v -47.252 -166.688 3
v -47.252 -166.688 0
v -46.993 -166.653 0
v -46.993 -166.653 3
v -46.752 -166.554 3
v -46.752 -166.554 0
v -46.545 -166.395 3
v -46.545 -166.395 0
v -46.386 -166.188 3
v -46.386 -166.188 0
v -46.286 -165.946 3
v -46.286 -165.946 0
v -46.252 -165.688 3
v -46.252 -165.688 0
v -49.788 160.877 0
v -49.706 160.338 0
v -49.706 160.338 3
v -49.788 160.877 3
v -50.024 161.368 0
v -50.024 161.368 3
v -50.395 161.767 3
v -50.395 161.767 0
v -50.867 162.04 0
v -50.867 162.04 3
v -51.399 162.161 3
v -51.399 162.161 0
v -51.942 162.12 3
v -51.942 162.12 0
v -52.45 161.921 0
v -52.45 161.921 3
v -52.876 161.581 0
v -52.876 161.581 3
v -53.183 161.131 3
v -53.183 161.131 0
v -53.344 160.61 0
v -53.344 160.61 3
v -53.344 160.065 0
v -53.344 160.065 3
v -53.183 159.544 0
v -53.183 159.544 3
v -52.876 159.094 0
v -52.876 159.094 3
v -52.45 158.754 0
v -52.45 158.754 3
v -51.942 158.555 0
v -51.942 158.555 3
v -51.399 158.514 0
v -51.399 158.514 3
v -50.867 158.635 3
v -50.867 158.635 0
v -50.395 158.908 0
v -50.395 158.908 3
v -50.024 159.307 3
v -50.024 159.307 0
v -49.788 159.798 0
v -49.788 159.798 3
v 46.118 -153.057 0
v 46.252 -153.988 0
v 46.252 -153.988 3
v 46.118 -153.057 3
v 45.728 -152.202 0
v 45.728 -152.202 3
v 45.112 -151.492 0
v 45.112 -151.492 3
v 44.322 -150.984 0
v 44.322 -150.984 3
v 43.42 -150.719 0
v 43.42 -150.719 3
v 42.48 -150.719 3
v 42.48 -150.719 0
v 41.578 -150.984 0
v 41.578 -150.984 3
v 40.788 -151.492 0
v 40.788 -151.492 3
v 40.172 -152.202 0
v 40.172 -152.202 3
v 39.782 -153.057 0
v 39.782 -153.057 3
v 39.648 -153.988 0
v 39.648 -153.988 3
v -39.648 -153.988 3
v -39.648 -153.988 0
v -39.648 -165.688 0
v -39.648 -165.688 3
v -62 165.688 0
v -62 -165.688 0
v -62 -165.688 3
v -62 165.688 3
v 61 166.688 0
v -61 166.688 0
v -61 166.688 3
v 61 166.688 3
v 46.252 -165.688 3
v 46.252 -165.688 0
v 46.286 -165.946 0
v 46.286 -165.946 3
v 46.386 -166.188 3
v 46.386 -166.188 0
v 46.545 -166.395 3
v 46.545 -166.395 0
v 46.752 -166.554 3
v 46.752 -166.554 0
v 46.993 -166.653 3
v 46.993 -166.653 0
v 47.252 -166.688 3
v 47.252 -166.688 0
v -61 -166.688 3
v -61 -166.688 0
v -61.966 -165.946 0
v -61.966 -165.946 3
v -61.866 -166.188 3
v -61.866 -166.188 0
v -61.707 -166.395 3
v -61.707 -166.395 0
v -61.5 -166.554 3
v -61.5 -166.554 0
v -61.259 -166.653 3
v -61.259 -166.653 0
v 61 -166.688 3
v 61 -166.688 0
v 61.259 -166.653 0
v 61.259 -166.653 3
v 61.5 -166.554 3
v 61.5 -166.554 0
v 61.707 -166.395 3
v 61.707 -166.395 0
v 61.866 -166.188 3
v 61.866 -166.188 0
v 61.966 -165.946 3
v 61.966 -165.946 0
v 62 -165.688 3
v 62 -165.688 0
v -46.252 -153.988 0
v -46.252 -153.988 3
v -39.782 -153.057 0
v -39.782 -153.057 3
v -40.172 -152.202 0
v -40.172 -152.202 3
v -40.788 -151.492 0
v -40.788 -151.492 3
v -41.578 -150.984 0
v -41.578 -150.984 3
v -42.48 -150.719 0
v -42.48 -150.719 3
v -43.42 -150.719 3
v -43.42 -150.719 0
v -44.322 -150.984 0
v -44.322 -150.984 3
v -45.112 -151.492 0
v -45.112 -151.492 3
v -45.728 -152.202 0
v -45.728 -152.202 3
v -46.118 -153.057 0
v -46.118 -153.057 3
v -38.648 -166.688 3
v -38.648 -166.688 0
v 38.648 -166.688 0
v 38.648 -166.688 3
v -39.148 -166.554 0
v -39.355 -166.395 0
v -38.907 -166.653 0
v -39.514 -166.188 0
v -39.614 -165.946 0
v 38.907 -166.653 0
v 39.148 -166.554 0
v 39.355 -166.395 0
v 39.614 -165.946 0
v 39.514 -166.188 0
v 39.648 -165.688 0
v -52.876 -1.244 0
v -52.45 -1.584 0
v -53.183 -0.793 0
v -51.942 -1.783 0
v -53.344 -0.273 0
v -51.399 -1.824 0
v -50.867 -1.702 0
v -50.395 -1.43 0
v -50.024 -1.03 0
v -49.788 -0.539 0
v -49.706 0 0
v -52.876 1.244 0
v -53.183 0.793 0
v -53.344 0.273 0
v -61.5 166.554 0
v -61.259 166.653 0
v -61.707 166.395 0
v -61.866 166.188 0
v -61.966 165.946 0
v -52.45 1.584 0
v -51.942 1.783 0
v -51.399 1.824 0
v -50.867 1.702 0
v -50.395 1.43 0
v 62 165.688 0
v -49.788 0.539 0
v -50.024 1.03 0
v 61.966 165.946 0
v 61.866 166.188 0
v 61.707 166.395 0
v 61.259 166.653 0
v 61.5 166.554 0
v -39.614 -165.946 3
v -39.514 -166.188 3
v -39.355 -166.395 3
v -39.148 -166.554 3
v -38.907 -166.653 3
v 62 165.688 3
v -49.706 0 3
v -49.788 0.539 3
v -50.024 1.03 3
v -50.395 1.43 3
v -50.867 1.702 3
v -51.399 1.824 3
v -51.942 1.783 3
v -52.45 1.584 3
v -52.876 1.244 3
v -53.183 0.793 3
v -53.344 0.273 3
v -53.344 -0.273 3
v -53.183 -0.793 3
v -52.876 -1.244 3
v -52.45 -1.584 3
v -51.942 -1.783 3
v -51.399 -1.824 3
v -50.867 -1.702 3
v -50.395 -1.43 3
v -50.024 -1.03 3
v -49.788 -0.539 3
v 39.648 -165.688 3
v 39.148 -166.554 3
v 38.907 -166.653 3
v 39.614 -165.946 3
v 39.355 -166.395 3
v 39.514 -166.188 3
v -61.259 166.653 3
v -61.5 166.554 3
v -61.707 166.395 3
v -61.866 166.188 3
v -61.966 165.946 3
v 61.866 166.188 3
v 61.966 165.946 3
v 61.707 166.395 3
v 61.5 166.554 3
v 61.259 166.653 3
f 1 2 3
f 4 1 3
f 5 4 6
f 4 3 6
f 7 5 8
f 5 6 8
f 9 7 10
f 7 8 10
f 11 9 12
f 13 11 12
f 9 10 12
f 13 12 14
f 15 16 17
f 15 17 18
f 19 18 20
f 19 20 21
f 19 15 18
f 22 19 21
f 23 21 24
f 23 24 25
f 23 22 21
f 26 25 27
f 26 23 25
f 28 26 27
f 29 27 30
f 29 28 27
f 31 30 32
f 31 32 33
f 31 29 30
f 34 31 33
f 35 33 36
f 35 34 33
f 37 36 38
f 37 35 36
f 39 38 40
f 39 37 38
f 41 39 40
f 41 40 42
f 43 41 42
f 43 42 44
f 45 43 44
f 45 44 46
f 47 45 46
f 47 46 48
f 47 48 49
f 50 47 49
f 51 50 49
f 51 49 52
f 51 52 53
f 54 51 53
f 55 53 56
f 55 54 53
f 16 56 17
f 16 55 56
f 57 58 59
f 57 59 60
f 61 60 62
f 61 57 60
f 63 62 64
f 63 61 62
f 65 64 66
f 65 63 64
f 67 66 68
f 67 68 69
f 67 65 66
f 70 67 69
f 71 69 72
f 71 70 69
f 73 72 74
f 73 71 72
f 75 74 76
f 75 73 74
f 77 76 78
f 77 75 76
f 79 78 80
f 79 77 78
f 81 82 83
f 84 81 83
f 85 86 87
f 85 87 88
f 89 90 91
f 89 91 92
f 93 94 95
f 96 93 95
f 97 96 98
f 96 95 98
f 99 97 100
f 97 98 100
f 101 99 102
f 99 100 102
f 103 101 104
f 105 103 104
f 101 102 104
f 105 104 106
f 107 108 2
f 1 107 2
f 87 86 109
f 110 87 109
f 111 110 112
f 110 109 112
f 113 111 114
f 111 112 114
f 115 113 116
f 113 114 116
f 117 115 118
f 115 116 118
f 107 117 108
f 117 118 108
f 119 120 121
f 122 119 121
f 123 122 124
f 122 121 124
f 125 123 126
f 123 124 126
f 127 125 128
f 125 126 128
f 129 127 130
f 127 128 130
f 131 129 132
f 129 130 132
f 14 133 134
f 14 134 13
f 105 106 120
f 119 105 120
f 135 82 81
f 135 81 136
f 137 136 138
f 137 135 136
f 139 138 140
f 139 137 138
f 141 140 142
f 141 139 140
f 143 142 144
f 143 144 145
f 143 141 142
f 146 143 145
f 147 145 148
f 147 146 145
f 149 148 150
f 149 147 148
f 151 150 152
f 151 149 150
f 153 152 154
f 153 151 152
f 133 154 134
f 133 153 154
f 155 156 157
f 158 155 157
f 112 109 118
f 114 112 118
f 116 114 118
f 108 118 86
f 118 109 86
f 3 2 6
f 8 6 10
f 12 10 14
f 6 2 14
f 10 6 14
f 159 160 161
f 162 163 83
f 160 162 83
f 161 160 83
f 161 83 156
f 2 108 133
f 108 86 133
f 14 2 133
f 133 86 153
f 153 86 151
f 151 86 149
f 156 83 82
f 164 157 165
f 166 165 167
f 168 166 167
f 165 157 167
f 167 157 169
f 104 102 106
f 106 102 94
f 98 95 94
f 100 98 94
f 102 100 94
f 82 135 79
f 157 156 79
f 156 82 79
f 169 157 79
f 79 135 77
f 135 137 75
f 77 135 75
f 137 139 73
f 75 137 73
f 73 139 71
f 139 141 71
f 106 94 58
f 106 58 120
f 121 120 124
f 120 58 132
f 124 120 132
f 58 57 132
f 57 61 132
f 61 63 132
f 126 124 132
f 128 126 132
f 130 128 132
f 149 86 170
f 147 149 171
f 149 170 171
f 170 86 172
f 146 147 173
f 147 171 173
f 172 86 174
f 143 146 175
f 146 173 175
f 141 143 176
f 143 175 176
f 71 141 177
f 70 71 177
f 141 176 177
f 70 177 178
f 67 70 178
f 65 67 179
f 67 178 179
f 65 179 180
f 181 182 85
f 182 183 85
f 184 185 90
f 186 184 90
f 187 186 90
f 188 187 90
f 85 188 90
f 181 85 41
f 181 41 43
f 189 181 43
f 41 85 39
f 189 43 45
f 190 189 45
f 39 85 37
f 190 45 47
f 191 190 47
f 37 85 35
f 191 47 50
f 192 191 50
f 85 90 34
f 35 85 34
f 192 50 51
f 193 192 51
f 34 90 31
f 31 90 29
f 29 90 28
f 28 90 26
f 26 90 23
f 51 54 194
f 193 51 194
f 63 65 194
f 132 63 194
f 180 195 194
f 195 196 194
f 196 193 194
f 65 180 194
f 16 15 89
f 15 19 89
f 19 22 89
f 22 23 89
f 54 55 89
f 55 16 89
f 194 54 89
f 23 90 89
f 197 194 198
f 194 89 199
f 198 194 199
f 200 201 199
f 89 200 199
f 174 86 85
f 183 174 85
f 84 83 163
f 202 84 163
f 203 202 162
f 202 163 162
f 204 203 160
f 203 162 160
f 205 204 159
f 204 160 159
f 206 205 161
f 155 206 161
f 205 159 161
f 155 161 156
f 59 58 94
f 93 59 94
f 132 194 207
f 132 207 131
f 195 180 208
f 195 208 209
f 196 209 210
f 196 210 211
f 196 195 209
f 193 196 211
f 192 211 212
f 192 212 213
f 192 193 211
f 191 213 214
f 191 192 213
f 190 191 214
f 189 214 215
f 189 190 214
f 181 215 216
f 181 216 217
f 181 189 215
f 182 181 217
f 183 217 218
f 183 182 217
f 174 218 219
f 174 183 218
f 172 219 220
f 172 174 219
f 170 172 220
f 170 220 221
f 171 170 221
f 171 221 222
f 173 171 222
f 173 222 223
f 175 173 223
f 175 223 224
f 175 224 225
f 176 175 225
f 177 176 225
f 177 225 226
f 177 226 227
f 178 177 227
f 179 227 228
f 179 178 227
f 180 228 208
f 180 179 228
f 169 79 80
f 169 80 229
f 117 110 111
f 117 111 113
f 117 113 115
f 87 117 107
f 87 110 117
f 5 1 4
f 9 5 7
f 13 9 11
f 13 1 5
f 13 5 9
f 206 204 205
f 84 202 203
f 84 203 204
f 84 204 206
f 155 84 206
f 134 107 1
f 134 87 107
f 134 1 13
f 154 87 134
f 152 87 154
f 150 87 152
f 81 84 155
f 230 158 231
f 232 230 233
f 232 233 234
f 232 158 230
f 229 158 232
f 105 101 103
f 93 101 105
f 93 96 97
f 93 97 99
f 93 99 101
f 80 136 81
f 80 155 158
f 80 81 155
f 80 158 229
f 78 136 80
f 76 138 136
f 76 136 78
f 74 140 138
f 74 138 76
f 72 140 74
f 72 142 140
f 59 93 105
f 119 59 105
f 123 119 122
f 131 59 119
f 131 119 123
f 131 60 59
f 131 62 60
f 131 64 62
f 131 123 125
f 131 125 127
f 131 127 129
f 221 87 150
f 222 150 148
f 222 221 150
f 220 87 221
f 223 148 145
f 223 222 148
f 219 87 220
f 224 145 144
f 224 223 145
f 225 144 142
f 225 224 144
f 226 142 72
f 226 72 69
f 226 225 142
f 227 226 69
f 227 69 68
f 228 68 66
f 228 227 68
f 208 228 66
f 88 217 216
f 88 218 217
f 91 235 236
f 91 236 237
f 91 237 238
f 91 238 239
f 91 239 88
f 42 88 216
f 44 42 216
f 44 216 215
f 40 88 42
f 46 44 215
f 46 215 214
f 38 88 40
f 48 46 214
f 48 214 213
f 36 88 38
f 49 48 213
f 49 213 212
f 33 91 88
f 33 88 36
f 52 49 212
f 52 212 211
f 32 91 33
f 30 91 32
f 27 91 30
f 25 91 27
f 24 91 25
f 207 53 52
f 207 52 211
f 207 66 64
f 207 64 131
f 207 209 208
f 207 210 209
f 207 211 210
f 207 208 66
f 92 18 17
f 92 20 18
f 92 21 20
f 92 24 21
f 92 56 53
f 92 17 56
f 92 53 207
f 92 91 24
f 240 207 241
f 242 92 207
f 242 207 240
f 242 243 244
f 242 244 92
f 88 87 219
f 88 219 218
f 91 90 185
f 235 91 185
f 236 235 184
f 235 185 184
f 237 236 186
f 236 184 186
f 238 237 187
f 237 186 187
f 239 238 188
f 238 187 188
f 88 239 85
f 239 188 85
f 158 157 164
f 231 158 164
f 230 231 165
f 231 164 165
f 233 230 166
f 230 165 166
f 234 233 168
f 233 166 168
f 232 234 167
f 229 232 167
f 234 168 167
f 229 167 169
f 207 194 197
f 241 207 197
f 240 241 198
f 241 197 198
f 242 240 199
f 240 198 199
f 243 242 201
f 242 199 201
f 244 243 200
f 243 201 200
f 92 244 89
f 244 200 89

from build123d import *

# Parameters (mm, degrees)
SKETCH_R  = 1.8288
PAD_DEPTH = 3


with BuildPart() as part:
    # Sketch → Pad (new body)
    with BuildSketch(Plane.XY):
        with BuildLine():
            ThreePointArc((-61, 166.6875), (-61.707107, 166.394607), (-62, 165.6875))
            Line((-62, -165.6875), (-62, 165.6875))
            ThreePointArc((-62, -165.6875), (-61.707107, -166.394607), (-61, -166.6875))
            Line((-61, -166.6875), (-47.252, -166.6875))
            ThreePointArc((-47.252, -166.6875), (-46.544893, -166.394607), (-46.252, -165.6875))
            Line((-46.252, -153.9875), (-46.252, -165.6875))
            ThreePointArc((-39.648, -153.9875), (-42.95, -150.6855), (-46.252, -153.9875))
            Line((-39.648, -153.9875), (-39.648, -165.6875))
            ThreePointArc((-39.648, -165.6875), (-39.355107, -166.394607), (-38.648, -166.6875))
            Line((-38.648, -166.6875), (38.648, -166.6875))
            ThreePointArc((38.648, -166.6875), (39.355107, -166.394607), (39.648, -165.6875))
            Line((39.648, -153.9875), (39.648, -165.6875))
            ThreePointArc((46.252, -153.9875), (42.95, -150.6855), (39.648, -153.9875))
            Line((46.252, -153.9875), (46.252, -165.6875))
            ThreePointArc((46.252, -165.6875), (46.544893, -166.394607), (47.252, -166.6875))
            Line((47.252, -166.6875), (61, -166.6875))
            ThreePointArc((61, -166.6875), (61.707107, -166.394607), (62, -165.6875))
            Line((62, 165.6875), (62, -165.6875))
            ThreePointArc((62, 165.6875), (61.707107, 166.394607), (61, 166.6875))
            Line((-61, 166.6875), (61, 166.6875))
        make_face()
        with Locations((-51.5352, 160.3375)):
            Circle(SKETCH_R, mode=Mode.SUBTRACT)
        with Locations((-51.5352, 0)):
            Circle(SKETCH_R, mode=Mode.SUBTRACT)
    extrude(amount=PAD_DEPTH)


solid = part.part
